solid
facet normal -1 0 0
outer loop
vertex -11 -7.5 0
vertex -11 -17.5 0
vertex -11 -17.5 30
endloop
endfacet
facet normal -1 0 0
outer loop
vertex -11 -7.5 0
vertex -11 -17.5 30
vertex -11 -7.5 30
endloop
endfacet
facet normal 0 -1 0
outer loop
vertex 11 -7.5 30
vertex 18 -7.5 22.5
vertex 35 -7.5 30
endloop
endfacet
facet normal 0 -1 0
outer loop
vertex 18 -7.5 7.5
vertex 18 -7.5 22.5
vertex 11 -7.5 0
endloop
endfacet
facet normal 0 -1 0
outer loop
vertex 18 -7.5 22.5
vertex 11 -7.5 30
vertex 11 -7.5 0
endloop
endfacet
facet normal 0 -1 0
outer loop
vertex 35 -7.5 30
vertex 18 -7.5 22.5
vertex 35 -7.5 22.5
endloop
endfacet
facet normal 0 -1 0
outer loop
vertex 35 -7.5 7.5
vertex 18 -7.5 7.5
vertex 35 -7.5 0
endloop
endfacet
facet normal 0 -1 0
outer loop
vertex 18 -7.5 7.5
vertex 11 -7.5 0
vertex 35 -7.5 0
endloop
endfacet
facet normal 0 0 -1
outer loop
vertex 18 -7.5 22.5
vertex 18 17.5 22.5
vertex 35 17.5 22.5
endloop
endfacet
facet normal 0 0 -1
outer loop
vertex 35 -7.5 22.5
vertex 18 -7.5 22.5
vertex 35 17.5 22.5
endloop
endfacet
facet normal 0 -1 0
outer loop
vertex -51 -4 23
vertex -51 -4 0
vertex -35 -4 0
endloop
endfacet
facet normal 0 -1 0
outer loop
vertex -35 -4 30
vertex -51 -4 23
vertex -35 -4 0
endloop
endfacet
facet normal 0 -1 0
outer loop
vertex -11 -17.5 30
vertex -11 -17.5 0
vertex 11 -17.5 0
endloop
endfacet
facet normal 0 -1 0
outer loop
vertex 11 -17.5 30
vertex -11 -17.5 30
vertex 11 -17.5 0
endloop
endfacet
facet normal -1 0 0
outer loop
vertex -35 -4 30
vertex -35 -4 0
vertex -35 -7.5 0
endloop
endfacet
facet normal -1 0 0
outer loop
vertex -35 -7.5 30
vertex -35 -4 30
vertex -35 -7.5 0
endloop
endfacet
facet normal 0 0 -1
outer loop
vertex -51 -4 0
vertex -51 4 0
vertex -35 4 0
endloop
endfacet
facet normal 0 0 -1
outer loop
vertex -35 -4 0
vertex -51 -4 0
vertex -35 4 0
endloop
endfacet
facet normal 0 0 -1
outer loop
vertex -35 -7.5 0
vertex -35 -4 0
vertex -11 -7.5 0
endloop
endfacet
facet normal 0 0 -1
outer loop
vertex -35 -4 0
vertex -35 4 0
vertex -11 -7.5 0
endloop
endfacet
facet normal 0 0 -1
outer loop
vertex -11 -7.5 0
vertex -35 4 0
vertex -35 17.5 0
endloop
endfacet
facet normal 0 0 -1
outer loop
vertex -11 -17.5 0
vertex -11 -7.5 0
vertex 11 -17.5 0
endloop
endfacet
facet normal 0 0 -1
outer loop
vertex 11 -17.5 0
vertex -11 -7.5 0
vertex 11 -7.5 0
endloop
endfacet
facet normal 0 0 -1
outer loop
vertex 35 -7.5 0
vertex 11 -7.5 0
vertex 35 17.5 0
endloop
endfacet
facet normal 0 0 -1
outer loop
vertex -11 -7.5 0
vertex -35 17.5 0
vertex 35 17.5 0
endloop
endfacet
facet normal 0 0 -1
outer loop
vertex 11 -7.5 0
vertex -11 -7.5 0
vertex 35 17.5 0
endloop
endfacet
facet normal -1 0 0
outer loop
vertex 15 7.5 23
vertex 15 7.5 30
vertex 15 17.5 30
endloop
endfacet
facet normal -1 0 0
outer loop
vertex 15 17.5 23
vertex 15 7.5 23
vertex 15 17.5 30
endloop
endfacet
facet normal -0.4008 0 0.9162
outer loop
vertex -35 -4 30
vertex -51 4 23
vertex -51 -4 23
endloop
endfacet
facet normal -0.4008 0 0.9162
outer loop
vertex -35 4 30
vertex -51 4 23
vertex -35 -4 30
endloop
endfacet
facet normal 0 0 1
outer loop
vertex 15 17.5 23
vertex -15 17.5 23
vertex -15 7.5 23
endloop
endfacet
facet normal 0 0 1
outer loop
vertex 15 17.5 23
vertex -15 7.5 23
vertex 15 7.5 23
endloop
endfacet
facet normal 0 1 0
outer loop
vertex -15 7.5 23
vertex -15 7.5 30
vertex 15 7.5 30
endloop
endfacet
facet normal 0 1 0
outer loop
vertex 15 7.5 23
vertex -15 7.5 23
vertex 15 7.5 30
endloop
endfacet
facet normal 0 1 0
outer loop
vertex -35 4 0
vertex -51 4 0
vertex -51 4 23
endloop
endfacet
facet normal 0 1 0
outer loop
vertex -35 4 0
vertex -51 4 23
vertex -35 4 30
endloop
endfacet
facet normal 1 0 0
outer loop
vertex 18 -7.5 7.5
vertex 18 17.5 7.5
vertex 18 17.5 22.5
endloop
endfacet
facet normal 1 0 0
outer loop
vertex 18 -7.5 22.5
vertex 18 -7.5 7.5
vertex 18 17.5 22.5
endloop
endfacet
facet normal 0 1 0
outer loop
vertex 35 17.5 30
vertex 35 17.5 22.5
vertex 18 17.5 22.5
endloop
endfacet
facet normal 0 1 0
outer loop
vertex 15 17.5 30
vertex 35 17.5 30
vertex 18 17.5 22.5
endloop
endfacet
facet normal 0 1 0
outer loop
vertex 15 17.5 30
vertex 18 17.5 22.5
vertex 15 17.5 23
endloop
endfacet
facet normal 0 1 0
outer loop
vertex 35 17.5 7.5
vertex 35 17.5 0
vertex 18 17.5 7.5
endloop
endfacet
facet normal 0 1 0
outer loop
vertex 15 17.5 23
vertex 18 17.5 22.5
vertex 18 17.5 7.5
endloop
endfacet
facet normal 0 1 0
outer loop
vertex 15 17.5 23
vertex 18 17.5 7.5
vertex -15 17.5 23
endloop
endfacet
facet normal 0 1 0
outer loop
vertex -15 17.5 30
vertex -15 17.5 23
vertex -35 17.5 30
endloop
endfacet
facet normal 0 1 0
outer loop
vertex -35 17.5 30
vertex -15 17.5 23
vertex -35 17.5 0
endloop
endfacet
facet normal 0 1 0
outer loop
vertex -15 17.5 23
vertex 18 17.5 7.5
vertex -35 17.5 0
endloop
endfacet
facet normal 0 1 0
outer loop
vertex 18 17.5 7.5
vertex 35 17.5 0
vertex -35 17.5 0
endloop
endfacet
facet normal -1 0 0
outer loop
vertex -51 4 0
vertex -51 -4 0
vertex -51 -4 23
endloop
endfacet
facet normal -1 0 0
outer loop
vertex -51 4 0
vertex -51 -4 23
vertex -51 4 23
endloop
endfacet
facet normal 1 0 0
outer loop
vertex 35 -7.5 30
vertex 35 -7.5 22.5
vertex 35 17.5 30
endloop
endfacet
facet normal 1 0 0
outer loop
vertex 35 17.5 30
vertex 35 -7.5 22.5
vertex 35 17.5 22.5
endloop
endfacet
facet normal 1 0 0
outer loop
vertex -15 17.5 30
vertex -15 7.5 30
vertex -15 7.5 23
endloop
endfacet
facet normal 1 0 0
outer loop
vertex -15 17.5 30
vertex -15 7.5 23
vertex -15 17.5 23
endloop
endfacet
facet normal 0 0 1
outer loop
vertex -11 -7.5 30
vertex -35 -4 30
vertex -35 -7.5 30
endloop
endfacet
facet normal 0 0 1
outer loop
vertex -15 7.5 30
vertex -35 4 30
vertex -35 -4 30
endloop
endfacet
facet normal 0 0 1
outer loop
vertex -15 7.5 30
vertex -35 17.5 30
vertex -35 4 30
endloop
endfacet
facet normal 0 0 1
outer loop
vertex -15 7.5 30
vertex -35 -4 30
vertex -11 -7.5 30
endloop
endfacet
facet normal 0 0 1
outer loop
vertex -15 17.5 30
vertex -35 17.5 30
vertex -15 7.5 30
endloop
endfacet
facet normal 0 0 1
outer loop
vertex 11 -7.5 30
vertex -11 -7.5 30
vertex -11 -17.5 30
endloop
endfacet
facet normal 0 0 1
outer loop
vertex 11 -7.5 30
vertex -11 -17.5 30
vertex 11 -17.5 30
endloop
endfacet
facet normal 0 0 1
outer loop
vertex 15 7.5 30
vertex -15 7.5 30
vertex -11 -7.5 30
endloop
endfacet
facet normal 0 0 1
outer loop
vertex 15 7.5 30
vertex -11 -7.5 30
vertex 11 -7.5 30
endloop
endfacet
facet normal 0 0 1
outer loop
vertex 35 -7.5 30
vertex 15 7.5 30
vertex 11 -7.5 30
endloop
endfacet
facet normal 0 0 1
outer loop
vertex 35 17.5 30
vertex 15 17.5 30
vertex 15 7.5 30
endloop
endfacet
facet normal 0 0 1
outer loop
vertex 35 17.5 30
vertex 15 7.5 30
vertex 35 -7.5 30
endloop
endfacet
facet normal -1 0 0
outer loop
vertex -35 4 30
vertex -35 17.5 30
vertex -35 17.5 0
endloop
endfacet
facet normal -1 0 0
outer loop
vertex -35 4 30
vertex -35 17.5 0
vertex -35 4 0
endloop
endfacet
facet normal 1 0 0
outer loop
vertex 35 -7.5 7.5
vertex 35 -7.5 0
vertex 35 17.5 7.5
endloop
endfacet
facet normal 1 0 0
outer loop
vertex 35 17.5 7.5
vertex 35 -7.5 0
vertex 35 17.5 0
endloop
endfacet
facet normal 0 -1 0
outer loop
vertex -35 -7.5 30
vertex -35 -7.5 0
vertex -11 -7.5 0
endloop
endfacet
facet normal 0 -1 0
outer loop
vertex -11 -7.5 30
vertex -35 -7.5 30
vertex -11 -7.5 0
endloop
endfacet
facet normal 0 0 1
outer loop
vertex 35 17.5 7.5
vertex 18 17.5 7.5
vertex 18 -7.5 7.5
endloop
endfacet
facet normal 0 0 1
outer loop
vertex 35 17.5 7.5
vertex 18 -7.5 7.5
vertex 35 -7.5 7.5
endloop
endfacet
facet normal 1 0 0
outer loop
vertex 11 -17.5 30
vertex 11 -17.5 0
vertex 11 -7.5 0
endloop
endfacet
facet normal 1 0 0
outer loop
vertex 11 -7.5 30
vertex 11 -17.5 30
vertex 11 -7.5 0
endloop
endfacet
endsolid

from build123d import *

# Parameters (mm, degrees)
SKETCH_1_W               = 22
SKETCH_1_H               = 10
SKETCH_1_W_2             = 16
SKETCH_1_H_2             = 8
EXTRUDE_1_DEPTH          = 30
CUT_EXTRUDE_1_DEPTH      = 30
CUT_EXTRUDE_1_DEPTH_BACK = 30
SKETCH_2_W               = 17
SKETCH_2_H               = 15
SKETCH_3_W               = 30
SKETCH_3_H               = 10
CUT_EXTRUDE_2_DEPTH      = 7


with BuildPart() as part:
    # Эскиз1 → Бобышка-Вытянуть1 (new body)
    with BuildSketch(Plane.XY):
        Polygon((-35, -7.5), (-11, -7.5), (11, -7.5), (35, -7.5), (35, 17.5), (-35, 17.5), (-35, 4), (-35, -4), align=None)
        with Locations((0, -12.5)):
            Rectangle(SKETCH_1_W, SKETCH_1_H)
        with Locations((-43, 0)):
            Rectangle(SKETCH_1_W_2, SKETCH_1_H_2)
    extrude(amount=EXTRUDE_1_DEPTH)

    # Эскиз2 → Вырез-Вытянуть1 (cut, two sides: drawn at the far end of the back side and taken through both)
    with BuildSketch(Plane.XZ.offset(4).offset(-CUT_EXTRUDE_1_DEPTH_BACK)):
        with Locations((26.5, 15)):
            Rectangle(SKETCH_2_W, SKETCH_2_H)
        Polygon((-35, 30), (-51, 30), (-51, 23), align=None)
    extrude(amount=CUT_EXTRUDE_1_DEPTH + CUT_EXTRUDE_1_DEPTH_BACK, mode=Mode.SUBTRACT)

    # Эскиз3 → Вырез-Вытянуть2 (cut)
    with BuildSketch(Plane.XY.offset(30)):
        with Locations((0, 12.5)):
            Rectangle(SKETCH_3_W, SKETCH_3_H)
    extrude(amount=-CUT_EXTRUDE_2_DEPTH, mode=Mode.SUBTRACT)


solid = part.part
